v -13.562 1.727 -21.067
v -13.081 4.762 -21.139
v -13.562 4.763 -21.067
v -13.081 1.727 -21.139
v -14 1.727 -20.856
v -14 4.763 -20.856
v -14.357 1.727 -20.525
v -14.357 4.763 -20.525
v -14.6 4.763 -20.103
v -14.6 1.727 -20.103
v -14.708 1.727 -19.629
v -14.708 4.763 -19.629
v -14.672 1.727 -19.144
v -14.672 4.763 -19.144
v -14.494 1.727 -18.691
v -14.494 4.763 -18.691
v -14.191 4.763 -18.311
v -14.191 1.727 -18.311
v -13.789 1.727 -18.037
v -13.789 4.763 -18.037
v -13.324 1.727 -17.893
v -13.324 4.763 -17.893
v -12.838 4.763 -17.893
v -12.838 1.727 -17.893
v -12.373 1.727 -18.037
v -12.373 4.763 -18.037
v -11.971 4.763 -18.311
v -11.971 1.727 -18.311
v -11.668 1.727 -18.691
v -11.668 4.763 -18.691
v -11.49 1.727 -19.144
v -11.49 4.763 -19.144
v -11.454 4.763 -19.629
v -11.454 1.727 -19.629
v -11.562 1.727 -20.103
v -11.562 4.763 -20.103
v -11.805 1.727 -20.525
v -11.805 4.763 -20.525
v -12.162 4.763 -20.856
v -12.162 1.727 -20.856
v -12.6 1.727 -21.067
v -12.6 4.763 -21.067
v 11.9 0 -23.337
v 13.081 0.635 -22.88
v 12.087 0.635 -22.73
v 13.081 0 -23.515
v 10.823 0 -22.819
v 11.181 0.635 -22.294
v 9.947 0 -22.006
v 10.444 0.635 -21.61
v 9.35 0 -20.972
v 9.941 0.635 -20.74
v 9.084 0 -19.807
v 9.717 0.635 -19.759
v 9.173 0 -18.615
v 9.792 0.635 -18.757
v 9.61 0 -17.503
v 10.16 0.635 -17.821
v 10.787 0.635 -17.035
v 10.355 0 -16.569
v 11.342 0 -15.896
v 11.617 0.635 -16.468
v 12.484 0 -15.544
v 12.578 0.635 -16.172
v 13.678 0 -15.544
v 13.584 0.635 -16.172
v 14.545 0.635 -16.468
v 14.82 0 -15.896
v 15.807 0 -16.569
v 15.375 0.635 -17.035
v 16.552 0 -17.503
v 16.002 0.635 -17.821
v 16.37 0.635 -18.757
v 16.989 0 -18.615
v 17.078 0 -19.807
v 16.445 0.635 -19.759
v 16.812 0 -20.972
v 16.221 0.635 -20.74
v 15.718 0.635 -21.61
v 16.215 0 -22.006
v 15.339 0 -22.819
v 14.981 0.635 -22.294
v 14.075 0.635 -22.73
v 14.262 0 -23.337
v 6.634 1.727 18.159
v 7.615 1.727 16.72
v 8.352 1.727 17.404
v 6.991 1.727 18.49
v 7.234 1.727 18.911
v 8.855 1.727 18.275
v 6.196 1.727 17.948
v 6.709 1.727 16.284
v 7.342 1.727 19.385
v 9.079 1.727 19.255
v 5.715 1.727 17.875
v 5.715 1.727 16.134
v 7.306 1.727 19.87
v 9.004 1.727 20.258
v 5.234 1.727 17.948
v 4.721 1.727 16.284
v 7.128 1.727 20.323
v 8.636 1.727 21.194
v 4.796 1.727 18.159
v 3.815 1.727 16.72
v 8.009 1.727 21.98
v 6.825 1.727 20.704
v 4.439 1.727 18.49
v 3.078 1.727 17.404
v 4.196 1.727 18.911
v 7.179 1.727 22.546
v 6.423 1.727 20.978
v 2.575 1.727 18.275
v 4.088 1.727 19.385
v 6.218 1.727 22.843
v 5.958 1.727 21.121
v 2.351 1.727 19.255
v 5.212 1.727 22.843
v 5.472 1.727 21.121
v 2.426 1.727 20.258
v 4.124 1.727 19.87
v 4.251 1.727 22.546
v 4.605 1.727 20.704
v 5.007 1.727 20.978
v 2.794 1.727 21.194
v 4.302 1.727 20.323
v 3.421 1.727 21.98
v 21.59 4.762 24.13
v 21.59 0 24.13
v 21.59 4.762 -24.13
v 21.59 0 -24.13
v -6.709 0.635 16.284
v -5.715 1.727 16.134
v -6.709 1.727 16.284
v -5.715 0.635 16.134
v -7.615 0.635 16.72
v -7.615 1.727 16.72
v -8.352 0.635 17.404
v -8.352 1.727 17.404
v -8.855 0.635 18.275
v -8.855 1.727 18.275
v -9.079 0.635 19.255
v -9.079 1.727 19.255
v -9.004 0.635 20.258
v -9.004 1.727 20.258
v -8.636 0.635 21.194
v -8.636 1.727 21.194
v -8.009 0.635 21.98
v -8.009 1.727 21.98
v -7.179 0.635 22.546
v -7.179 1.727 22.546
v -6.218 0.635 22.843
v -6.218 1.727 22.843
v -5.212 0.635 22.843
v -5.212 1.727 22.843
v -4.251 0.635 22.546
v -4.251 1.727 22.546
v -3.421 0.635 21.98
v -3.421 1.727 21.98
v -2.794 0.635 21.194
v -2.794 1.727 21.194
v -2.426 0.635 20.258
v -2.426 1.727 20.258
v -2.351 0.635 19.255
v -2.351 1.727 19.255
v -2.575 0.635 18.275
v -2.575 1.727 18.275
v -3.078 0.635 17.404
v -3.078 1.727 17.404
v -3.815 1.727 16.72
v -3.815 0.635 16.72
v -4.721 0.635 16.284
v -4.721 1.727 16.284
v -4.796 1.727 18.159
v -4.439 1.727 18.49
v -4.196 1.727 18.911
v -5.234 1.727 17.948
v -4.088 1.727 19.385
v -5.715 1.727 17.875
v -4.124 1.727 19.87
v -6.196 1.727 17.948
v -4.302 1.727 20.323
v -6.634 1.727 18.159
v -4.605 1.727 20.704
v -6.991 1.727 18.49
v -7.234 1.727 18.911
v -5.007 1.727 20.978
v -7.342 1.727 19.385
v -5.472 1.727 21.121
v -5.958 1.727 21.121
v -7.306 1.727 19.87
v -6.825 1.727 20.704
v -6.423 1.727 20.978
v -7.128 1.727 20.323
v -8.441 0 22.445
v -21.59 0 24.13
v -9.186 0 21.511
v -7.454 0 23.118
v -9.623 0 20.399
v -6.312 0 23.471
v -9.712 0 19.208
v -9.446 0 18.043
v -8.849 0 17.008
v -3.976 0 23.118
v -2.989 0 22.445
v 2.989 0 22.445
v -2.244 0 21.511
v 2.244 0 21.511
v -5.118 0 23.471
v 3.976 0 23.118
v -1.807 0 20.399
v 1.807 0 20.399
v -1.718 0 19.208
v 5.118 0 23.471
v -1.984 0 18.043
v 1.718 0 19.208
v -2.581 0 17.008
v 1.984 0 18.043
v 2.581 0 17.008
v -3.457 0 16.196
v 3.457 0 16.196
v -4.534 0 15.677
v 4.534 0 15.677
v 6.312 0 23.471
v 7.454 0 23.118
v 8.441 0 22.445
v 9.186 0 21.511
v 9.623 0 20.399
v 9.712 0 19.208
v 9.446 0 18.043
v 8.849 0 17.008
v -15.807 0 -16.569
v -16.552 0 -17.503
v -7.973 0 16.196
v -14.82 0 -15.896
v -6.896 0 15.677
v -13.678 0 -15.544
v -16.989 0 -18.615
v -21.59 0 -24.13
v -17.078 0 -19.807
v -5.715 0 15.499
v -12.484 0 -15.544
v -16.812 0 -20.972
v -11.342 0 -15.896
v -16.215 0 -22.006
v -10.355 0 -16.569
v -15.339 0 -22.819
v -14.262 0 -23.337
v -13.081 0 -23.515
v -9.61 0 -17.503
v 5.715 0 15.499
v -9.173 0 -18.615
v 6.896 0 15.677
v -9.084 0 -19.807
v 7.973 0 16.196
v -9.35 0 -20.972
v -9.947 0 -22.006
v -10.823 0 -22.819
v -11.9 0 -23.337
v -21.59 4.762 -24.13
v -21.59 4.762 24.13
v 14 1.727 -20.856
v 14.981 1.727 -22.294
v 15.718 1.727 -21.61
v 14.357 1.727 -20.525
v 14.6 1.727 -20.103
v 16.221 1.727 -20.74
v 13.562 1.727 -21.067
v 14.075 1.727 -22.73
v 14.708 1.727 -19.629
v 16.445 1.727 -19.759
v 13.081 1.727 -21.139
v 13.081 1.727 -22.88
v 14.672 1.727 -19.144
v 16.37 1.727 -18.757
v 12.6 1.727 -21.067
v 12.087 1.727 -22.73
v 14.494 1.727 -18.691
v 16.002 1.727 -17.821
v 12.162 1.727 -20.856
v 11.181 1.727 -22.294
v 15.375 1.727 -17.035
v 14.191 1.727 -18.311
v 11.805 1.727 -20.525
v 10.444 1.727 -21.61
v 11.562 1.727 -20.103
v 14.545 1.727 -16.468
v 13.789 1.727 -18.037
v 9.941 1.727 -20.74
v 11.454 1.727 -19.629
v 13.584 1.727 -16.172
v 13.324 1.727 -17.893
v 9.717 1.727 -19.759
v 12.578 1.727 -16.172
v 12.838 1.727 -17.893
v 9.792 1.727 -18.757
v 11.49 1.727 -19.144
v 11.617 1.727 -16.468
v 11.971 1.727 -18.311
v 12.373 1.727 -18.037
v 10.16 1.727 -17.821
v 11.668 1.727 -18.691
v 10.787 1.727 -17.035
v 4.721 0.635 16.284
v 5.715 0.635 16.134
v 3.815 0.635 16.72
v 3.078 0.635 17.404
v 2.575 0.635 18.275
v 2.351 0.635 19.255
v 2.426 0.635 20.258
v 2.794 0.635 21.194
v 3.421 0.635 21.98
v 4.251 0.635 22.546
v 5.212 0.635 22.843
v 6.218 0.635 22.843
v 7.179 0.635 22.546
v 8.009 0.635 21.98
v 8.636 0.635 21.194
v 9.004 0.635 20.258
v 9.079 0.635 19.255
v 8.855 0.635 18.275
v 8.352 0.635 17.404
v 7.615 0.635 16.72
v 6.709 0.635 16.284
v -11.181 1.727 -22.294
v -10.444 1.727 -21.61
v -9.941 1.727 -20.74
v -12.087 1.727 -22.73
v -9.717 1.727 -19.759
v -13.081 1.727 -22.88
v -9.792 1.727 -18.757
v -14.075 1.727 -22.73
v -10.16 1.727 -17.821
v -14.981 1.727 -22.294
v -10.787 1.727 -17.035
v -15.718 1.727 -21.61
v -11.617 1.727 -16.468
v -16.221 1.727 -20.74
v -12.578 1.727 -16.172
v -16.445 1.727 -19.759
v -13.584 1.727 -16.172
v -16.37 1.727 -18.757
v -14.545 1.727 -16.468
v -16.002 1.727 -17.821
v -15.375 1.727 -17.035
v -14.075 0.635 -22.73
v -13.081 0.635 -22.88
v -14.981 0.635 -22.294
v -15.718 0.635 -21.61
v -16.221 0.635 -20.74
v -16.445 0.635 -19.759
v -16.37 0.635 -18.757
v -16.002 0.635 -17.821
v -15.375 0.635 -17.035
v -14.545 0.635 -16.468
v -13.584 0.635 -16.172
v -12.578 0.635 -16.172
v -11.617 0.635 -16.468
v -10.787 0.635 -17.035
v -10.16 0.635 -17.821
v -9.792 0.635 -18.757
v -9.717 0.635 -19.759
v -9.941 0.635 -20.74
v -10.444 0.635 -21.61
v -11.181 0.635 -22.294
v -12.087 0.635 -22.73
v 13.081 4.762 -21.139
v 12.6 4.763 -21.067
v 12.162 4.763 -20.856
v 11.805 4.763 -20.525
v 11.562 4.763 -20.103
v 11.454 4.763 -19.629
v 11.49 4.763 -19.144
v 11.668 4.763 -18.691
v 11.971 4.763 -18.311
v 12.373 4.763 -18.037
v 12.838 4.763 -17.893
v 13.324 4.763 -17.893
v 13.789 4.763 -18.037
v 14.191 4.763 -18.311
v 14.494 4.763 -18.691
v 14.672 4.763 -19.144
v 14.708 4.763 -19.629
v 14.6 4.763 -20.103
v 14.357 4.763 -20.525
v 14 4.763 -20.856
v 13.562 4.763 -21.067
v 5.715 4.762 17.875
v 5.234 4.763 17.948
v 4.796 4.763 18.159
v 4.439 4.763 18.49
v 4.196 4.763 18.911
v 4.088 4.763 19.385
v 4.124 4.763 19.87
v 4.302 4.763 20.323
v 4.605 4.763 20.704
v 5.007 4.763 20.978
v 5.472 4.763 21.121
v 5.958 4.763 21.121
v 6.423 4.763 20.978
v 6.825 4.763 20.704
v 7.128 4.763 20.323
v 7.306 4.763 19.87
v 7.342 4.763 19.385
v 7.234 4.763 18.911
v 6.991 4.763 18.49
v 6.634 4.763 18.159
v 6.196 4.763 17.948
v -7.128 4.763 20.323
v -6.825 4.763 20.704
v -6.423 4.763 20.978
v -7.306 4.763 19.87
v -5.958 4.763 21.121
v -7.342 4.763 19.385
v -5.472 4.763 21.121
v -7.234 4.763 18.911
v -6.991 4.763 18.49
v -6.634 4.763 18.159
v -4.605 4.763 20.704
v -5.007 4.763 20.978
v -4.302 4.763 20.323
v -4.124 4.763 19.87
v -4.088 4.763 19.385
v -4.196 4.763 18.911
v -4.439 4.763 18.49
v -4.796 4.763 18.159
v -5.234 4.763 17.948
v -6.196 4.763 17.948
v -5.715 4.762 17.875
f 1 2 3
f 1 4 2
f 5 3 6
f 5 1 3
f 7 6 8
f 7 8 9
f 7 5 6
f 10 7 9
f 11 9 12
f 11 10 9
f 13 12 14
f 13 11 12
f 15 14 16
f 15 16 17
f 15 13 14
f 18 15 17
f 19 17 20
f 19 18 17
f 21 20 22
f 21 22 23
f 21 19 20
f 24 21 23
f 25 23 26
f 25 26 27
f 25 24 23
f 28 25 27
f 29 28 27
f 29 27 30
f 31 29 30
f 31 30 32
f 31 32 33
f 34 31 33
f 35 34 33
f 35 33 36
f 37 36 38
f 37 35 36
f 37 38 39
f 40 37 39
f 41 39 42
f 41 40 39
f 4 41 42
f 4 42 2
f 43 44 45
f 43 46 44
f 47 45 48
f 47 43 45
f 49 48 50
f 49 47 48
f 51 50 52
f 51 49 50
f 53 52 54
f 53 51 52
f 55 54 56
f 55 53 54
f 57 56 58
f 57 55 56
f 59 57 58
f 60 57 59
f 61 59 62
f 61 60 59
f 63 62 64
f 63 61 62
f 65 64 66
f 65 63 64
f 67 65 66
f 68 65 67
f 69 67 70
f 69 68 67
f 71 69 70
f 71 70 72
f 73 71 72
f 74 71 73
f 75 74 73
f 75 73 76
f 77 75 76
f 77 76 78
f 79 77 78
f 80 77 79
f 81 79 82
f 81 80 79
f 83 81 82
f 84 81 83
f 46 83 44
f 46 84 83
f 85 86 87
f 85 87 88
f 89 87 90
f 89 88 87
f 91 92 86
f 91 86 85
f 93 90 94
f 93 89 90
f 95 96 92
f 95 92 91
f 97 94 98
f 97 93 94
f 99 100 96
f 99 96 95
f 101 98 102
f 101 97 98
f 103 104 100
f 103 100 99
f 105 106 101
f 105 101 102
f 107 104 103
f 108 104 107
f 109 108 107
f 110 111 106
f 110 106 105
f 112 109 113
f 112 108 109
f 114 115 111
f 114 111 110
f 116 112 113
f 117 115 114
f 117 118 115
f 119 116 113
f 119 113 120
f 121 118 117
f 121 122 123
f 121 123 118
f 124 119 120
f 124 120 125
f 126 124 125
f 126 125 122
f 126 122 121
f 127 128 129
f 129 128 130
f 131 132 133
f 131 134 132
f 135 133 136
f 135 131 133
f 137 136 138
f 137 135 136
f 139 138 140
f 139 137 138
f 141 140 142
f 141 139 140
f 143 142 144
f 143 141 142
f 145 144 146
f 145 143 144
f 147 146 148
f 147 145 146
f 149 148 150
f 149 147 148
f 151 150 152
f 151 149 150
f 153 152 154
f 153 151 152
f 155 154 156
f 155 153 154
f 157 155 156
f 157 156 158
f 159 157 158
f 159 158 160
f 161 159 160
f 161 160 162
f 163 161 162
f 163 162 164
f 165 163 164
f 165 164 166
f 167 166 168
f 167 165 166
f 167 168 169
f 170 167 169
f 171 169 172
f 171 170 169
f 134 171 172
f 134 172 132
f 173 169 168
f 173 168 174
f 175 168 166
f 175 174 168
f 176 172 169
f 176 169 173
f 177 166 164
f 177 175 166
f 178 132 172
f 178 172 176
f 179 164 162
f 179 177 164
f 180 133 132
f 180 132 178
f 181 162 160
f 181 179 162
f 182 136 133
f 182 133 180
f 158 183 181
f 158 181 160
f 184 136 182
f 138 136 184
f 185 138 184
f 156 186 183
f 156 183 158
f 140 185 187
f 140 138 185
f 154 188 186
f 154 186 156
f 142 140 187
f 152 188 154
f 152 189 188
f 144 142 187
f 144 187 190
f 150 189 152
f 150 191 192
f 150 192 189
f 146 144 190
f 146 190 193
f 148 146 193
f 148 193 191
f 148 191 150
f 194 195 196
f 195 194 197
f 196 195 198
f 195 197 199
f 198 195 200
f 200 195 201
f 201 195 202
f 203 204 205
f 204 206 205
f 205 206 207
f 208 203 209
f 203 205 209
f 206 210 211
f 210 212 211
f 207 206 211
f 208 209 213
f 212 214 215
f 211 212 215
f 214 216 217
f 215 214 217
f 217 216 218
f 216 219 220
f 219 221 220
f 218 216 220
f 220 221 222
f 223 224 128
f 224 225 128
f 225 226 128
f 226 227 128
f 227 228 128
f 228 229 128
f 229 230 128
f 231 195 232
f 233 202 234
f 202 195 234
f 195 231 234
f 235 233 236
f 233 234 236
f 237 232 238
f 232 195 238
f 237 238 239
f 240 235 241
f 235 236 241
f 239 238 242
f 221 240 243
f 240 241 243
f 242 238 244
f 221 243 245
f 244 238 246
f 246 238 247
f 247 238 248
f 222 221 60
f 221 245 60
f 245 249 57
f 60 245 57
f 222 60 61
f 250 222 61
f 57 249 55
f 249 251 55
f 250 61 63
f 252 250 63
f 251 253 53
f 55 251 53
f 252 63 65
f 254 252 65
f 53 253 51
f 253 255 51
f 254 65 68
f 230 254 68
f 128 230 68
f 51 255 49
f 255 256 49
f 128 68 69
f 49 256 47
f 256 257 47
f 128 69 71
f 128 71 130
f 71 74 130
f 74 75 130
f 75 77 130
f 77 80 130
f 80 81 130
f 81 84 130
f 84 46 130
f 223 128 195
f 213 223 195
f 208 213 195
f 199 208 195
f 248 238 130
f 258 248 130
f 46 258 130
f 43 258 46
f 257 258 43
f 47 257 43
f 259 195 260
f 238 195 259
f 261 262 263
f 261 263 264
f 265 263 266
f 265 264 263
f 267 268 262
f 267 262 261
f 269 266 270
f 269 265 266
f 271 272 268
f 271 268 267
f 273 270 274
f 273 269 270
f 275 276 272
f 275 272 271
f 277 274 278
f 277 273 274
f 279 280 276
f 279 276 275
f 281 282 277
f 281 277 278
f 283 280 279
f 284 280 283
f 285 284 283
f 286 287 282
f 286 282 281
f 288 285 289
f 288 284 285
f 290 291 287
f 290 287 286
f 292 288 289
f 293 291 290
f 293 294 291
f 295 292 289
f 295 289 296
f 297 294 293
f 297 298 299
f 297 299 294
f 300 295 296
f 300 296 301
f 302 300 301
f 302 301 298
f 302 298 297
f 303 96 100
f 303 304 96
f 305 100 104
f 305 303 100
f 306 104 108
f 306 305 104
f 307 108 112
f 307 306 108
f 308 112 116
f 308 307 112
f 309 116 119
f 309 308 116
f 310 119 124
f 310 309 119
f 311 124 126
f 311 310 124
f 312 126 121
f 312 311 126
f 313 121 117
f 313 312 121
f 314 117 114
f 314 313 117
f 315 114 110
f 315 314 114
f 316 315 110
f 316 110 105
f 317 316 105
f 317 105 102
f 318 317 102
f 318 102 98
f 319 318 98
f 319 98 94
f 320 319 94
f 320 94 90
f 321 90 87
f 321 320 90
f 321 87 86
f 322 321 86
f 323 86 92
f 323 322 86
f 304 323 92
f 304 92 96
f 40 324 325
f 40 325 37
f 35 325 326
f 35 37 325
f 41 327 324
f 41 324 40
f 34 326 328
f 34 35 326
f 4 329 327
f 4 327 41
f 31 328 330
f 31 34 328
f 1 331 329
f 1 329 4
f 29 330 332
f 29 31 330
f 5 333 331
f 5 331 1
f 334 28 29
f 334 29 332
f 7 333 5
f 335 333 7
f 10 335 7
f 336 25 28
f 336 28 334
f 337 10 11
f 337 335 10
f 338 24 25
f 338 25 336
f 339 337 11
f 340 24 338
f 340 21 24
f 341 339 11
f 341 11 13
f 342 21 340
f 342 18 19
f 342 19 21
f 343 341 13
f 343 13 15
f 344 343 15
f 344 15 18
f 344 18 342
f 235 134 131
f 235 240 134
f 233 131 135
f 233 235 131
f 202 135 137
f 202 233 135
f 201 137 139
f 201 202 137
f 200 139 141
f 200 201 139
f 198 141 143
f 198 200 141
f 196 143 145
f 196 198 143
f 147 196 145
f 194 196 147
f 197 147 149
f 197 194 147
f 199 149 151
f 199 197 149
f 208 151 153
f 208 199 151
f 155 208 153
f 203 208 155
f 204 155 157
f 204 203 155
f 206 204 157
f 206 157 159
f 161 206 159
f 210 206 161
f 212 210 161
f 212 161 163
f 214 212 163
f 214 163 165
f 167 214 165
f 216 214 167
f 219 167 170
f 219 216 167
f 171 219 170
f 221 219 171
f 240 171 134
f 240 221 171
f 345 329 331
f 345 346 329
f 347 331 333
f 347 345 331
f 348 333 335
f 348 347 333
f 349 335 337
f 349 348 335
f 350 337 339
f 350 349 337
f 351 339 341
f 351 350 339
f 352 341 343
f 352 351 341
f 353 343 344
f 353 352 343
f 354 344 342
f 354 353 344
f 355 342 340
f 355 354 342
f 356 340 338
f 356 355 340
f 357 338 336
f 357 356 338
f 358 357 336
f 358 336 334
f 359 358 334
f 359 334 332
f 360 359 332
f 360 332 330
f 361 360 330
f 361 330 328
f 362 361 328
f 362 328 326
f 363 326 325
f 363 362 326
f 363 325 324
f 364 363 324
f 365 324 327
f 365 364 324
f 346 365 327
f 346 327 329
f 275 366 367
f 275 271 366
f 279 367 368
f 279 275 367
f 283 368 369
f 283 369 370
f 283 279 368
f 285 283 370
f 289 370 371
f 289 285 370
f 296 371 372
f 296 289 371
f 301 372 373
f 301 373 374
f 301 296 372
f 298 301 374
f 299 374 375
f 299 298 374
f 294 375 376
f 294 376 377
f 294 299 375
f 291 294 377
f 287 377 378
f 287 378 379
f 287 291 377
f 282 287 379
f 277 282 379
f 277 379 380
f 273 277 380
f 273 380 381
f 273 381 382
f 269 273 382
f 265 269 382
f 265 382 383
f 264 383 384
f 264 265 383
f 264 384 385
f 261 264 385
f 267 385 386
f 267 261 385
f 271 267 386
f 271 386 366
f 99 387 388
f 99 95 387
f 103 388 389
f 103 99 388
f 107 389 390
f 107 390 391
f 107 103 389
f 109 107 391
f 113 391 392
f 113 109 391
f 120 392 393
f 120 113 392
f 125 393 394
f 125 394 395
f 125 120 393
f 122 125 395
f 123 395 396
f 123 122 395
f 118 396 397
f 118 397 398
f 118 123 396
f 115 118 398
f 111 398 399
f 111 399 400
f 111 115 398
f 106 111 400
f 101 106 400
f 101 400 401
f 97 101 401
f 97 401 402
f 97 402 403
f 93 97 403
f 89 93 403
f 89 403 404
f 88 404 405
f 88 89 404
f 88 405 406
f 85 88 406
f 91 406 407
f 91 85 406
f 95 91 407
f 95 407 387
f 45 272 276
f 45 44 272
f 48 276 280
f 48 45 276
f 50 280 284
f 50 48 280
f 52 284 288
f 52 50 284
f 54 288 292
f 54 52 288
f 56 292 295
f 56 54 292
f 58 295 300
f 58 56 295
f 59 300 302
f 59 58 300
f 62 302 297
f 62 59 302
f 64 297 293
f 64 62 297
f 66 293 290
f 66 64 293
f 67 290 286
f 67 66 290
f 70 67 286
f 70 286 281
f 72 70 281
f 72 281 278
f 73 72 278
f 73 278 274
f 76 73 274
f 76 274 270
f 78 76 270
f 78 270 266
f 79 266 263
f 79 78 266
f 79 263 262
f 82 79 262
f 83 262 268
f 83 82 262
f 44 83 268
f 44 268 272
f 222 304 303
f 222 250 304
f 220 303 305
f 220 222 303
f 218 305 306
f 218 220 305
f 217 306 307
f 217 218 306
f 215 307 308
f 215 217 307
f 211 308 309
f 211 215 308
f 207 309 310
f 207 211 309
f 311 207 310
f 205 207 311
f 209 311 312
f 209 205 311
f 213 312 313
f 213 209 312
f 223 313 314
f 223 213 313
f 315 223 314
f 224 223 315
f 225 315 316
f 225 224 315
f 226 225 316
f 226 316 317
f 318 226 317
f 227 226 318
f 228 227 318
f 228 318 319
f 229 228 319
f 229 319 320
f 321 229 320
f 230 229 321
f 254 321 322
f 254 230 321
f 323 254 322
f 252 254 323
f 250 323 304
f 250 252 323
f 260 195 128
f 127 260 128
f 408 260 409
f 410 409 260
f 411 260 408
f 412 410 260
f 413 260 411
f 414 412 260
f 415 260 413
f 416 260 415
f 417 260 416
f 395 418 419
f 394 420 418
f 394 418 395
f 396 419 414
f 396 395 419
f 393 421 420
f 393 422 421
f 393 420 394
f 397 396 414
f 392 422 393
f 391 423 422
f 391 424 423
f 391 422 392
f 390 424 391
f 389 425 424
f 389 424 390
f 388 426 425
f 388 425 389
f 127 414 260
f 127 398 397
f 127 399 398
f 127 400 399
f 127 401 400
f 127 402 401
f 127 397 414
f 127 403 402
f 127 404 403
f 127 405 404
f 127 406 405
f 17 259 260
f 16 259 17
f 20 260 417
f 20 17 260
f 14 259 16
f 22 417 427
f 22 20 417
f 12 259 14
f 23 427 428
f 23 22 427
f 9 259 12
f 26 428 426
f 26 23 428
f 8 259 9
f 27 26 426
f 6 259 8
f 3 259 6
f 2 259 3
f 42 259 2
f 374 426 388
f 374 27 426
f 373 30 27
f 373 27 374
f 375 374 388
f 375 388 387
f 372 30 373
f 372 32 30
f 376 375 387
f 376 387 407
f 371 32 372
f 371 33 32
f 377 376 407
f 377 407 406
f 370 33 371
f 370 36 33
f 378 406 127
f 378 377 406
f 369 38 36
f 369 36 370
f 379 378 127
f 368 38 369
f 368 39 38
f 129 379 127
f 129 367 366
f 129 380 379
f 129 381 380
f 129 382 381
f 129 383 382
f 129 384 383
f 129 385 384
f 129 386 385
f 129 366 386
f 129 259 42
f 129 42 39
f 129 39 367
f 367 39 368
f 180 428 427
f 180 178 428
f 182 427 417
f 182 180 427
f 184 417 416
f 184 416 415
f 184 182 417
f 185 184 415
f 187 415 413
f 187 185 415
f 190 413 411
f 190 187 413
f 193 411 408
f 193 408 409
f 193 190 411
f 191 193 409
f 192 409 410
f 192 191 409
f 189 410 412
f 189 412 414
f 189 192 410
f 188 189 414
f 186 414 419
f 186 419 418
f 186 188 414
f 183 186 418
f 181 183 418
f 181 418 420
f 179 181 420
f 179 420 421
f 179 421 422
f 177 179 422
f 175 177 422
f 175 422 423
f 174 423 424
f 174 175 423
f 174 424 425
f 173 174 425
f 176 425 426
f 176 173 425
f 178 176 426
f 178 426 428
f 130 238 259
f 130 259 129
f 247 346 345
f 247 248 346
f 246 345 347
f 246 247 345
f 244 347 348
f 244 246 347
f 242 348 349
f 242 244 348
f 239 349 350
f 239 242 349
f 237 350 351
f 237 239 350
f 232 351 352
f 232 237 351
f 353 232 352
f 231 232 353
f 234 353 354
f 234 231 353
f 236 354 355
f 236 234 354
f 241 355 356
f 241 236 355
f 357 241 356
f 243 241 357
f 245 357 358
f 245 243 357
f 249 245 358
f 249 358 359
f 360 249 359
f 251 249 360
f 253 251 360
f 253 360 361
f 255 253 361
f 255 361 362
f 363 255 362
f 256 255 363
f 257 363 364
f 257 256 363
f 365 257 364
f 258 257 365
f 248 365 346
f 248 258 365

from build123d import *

# Parameters (mm, degrees)
SKETCH1_W             = 43.18
SKETCH1_H             = 48.26
BASE_DEPTH            = 4.7625
MOTORHOLES_AT_2_COUNT = 2
MOTORHOLES_AT_2_PITCH = 11.43
MOTORHOLES_AT_3_COUNT = 2
MOTORHOLES_AT_3_PITCH = 43.30603911
MOTORHOLES_AT_4_COUNT = 2
MOTORHOLES_AT_4_PITCH = 39.703669394


with BuildPart() as part:
    # Sketch1 → Base (new body)
    with BuildSketch(Plane(origin=(0, 0, 0), x_dir=(1, 0, 0), z_dir=(0, 1, 0))):
        Rectangle(SKETCH1_W, SKETCH1_H)
    extrude(amount=BASE_DEPTH)

    # Sketch2 → MotorHoles (revolve, cut)
    with BuildSketch(Plane(origin=(5.715, 0, 19.5072), x_dir=(0, 0, -1), z_dir=(1, 0, 0))):
        Polygon((0, 0), (0, 4.7625), (1.63195, 4.7625), (1.63195, 1.7272), (3.37312, 1.7272), (3.37312, 0.635), (4.00812, 0), align=None)
    motorholes = revolve(axis=Axis((5.715, -6.35, 19.5072), (0, 1, 0)), mode=Mode.SUBTRACT)

    # MotorHoles at 2: MotorHoles ×2
    with Locations(*[(-i * MOTORHOLES_AT_2_PITCH, 0, 0) for i in range(1, MOTORHOLES_AT_2_COUNT)]):
        add(motorholes, mode=Mode.SUBTRACT)

    # MotorHoles at 3: MotorHoles ×2
    with Locations(*[Vector(-0.43402722545097383, 0, -0.9008997544495889) * (i * MOTORHOLES_AT_3_PITCH) for i in range(1, MOTORHOLES_AT_3_COUNT)]):
        add(motorholes, mode=Mode.SUBTRACT)

    # MotorHoles at 4: MotorHoles ×2
    with Locations(*[Vector(0.1855244140503859, 0, -0.9826396551082502) * (i * MOTORHOLES_AT_4_PITCH) for i in range(1, MOTORHOLES_AT_4_COUNT)]):
        add(motorholes, mode=Mode.SUBTRACT)


solid = part.part
